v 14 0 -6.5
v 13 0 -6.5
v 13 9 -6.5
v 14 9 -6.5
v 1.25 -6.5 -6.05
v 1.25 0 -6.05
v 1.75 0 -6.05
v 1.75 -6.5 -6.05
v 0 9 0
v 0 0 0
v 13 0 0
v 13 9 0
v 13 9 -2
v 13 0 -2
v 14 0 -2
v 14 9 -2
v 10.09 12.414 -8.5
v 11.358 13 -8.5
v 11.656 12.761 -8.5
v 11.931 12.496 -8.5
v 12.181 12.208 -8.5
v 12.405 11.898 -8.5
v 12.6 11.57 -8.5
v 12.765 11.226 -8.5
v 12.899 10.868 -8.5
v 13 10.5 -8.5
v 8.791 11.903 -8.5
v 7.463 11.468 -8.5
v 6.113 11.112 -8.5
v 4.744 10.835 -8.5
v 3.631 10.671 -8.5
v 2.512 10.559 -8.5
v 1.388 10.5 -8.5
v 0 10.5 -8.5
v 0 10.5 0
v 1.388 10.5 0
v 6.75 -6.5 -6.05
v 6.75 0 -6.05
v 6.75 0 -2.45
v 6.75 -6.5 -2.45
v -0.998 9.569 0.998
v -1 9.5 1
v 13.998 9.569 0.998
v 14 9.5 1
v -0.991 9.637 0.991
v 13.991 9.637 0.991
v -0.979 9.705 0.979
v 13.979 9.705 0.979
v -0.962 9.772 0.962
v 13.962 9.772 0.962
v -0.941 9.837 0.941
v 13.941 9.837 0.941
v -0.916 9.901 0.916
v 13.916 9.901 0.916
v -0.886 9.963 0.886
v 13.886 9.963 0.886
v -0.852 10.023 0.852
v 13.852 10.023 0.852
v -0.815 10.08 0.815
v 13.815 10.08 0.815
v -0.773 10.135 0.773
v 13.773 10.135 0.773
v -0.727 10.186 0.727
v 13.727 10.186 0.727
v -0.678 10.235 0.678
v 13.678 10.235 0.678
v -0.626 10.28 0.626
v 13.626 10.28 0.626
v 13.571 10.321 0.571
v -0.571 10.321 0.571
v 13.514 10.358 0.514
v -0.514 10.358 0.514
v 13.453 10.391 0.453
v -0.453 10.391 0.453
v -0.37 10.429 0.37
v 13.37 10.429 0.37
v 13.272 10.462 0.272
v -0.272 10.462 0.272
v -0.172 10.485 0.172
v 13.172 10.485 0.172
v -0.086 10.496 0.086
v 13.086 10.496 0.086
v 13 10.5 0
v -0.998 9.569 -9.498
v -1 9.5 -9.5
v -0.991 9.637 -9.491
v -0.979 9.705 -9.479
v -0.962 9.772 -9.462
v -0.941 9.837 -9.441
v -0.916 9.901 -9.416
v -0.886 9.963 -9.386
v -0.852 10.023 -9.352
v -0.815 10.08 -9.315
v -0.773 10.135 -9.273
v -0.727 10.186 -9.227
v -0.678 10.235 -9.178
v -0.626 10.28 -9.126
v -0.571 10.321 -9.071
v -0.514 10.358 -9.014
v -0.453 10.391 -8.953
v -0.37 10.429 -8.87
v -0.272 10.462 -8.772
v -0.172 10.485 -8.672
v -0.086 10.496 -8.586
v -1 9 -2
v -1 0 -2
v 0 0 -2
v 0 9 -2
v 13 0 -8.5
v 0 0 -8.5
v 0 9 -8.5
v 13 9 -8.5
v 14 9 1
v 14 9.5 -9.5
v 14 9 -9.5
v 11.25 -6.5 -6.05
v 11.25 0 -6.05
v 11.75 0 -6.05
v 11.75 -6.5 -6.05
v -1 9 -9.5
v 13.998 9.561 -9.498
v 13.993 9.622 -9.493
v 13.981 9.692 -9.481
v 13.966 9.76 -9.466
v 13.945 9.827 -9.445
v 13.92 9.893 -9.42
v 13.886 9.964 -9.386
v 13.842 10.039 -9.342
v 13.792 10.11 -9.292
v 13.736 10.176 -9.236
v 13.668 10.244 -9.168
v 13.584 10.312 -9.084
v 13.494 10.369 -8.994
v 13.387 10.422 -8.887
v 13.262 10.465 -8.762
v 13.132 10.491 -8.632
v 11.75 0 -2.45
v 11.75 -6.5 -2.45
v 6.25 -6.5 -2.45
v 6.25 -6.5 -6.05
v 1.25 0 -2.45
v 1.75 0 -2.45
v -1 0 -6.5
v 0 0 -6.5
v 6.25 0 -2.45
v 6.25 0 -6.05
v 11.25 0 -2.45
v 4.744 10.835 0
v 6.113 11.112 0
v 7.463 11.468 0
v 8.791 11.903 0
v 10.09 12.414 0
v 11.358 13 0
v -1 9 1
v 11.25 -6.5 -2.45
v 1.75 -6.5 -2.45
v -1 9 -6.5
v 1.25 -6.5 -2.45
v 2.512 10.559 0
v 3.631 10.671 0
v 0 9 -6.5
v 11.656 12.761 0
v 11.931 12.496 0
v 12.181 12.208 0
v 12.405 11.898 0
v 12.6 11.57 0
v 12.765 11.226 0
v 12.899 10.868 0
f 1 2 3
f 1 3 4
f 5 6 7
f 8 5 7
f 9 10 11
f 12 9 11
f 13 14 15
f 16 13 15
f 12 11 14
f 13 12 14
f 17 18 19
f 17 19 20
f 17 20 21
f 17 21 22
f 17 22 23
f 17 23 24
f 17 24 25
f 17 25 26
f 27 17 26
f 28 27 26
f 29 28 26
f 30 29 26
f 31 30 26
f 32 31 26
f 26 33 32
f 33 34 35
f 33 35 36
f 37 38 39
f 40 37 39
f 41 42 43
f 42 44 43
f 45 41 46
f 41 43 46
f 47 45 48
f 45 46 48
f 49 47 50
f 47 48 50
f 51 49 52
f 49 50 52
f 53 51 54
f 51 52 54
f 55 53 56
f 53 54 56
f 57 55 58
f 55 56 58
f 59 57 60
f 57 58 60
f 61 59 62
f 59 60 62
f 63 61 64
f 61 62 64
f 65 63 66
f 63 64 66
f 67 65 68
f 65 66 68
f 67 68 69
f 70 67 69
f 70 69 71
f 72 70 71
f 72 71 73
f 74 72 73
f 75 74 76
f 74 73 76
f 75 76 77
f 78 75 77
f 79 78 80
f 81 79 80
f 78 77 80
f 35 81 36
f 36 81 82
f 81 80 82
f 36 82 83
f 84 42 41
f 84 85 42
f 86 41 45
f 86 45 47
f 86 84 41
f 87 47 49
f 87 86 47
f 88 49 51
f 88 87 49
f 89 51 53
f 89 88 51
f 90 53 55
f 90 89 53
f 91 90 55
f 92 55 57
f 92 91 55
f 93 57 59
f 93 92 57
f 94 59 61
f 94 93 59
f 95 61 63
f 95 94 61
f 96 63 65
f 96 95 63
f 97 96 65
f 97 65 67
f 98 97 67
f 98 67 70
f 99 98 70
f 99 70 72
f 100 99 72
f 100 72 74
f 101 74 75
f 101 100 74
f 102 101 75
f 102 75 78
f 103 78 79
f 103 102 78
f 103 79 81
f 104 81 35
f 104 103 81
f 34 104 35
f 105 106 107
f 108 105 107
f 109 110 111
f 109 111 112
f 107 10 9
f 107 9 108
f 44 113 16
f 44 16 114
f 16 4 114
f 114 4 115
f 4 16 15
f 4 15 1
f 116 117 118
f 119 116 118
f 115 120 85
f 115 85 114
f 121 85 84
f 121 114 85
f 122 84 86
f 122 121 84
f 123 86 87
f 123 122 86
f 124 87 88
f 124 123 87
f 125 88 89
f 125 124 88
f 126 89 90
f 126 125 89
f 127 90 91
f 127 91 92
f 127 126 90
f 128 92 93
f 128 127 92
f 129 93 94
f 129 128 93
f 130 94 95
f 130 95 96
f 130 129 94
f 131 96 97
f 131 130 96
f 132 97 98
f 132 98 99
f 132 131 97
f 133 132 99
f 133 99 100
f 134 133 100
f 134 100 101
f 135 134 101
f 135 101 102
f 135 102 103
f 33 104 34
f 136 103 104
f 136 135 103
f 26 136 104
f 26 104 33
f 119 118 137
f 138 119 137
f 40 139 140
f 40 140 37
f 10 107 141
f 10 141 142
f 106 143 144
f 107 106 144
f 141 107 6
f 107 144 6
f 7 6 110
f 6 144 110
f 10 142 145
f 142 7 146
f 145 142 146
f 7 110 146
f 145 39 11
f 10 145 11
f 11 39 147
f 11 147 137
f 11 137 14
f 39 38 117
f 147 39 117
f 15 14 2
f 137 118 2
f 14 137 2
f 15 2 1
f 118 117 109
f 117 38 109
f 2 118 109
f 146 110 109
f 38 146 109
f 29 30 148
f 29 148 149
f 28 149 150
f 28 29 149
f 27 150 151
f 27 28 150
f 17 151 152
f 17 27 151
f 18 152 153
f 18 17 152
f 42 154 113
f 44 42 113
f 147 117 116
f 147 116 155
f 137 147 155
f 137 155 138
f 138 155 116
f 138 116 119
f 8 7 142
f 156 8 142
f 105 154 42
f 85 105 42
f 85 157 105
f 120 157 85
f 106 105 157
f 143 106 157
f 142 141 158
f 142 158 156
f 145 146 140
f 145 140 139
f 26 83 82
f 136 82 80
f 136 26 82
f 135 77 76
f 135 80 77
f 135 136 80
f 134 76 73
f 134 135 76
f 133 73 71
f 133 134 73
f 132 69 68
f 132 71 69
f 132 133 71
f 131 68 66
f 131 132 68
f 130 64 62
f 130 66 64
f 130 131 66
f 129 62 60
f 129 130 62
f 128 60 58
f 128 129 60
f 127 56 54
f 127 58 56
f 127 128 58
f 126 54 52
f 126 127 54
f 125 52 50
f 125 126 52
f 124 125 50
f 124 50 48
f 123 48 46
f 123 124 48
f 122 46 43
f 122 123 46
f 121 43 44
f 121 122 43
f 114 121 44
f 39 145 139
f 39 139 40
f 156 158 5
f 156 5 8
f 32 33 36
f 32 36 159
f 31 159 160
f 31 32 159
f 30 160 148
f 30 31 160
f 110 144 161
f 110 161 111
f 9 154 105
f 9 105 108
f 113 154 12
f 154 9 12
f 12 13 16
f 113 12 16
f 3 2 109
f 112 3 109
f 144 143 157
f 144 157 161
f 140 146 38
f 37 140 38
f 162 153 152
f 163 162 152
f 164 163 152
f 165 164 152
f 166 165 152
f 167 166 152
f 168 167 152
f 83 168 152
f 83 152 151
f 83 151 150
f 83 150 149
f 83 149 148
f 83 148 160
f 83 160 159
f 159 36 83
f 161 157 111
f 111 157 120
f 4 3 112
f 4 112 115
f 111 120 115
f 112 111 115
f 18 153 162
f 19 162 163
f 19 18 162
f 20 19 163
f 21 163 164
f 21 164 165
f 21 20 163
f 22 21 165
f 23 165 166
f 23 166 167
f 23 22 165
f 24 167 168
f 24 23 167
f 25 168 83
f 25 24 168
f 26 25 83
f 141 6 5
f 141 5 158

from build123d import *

# Parameters (mm, degrees)
ESQUISSE1_W        = 13
ESQUISSE1_H        = 8.5
ESQUISSE1_W_2      = 1
ESQUISSE1_H_2      = 4.5
BOSS_EXTRU_1_DEPTH = 9
ESQUISSE2_W        = 15
ESQUISSE2_H        = 10.5
BOSS_EXTRU_2_DEPTH = 1.5
CONG_1_R           = 1
ESQUISSE3_W        = 0.5
ESQUISSE3_H        = 3.6
BOSS_EXTRU_3_DEPTH = 6.5
BOSS_EXTRU_4_DEPTH = 8.5


with BuildPart() as part:
    # Esquisse1 → Boss.-Extru.1 (new body)
    with BuildSketch(Plane(origin=(0, 0, 0), x_dir=(1, 0, 0), z_dir=(0, 1, 0))):
        with Locations((6.5, 4.25)):
            Rectangle(ESQUISSE1_W, ESQUISSE1_H)
        with Locations((-0.5, 4.25)):
            Rectangle(ESQUISSE1_W_2, ESQUISSE1_H_2)
        with Locations((13.5, 4.25)):
            Rectangle(ESQUISSE1_W_2, ESQUISSE1_H_2)
    extrude(amount=BOSS_EXTRU_1_DEPTH)

    # Esquisse2 → Boss.-Extru.2 (add)
    with BuildSketch(Plane(origin=(0, 9, 0), x_dir=(1, 0, 0), z_dir=(0, 1, 0))):
        with Locations((6.5, 4.25)):
            Rectangle(ESQUISSE2_W, ESQUISSE2_H)
    extrude(amount=BOSS_EXTRU_2_DEPTH)

    # Congé1
    cong_1_edges = [part.edges().sort_by_distance(p)[0] for p in [
        (-1, 10.5, -4.25),
        (6.5, 10.5, 1),
        (14, 10.5, -4.25),
        (6.5, 10.5, -9.5),
    ]]
    fillet(cong_1_edges, radius=CONG_1_R)

    # Esquisse3 → Boss.-Extru.3 (add)
    with BuildSketch(Plane.XZ):
        with Locations((6.5, -4.25)):
            Rectangle(ESQUISSE3_W, ESQUISSE3_H)
        with Locations((1.5, -4.25)):
            Rectangle(ESQUISSE3_W, ESQUISSE3_H)
        with Locations((11.5, -4.25)):
            Rectangle(ESQUISSE3_W, ESQUISSE3_H)
    extrude(amount=BOSS_EXTRU_3_DEPTH)

    # Esquisse4 → Boss.-Extru.4 (add)
    with BuildSketch(Plane(origin=(0, 0, -8.5), x_dir=(-1, 0, 0), z_dir=(0, 0, -1))):
        with BuildLine():
            ThreePointArc((-11.358192951, 13), (-12.404531, 11.898047996), (-13, 10.5))
            Line((-13, 10.5), (-4.652568423, 10.5))
            Line((-4.652568423, 10.5), (-1.388259271, 10.5))
            ThreePointArc((-1.388259271, 10.5), (-3.07180416, 10.608445517), (-4.743510251, 10.835343224))
            ThreePointArc((-4.743510251, 10.835343224), (-8.130042008, 11.675684327), (-11.358192951, 13))
        make_face()
    extrude(amount=-BOSS_EXTRU_4_DEPTH)


solid = part.part
